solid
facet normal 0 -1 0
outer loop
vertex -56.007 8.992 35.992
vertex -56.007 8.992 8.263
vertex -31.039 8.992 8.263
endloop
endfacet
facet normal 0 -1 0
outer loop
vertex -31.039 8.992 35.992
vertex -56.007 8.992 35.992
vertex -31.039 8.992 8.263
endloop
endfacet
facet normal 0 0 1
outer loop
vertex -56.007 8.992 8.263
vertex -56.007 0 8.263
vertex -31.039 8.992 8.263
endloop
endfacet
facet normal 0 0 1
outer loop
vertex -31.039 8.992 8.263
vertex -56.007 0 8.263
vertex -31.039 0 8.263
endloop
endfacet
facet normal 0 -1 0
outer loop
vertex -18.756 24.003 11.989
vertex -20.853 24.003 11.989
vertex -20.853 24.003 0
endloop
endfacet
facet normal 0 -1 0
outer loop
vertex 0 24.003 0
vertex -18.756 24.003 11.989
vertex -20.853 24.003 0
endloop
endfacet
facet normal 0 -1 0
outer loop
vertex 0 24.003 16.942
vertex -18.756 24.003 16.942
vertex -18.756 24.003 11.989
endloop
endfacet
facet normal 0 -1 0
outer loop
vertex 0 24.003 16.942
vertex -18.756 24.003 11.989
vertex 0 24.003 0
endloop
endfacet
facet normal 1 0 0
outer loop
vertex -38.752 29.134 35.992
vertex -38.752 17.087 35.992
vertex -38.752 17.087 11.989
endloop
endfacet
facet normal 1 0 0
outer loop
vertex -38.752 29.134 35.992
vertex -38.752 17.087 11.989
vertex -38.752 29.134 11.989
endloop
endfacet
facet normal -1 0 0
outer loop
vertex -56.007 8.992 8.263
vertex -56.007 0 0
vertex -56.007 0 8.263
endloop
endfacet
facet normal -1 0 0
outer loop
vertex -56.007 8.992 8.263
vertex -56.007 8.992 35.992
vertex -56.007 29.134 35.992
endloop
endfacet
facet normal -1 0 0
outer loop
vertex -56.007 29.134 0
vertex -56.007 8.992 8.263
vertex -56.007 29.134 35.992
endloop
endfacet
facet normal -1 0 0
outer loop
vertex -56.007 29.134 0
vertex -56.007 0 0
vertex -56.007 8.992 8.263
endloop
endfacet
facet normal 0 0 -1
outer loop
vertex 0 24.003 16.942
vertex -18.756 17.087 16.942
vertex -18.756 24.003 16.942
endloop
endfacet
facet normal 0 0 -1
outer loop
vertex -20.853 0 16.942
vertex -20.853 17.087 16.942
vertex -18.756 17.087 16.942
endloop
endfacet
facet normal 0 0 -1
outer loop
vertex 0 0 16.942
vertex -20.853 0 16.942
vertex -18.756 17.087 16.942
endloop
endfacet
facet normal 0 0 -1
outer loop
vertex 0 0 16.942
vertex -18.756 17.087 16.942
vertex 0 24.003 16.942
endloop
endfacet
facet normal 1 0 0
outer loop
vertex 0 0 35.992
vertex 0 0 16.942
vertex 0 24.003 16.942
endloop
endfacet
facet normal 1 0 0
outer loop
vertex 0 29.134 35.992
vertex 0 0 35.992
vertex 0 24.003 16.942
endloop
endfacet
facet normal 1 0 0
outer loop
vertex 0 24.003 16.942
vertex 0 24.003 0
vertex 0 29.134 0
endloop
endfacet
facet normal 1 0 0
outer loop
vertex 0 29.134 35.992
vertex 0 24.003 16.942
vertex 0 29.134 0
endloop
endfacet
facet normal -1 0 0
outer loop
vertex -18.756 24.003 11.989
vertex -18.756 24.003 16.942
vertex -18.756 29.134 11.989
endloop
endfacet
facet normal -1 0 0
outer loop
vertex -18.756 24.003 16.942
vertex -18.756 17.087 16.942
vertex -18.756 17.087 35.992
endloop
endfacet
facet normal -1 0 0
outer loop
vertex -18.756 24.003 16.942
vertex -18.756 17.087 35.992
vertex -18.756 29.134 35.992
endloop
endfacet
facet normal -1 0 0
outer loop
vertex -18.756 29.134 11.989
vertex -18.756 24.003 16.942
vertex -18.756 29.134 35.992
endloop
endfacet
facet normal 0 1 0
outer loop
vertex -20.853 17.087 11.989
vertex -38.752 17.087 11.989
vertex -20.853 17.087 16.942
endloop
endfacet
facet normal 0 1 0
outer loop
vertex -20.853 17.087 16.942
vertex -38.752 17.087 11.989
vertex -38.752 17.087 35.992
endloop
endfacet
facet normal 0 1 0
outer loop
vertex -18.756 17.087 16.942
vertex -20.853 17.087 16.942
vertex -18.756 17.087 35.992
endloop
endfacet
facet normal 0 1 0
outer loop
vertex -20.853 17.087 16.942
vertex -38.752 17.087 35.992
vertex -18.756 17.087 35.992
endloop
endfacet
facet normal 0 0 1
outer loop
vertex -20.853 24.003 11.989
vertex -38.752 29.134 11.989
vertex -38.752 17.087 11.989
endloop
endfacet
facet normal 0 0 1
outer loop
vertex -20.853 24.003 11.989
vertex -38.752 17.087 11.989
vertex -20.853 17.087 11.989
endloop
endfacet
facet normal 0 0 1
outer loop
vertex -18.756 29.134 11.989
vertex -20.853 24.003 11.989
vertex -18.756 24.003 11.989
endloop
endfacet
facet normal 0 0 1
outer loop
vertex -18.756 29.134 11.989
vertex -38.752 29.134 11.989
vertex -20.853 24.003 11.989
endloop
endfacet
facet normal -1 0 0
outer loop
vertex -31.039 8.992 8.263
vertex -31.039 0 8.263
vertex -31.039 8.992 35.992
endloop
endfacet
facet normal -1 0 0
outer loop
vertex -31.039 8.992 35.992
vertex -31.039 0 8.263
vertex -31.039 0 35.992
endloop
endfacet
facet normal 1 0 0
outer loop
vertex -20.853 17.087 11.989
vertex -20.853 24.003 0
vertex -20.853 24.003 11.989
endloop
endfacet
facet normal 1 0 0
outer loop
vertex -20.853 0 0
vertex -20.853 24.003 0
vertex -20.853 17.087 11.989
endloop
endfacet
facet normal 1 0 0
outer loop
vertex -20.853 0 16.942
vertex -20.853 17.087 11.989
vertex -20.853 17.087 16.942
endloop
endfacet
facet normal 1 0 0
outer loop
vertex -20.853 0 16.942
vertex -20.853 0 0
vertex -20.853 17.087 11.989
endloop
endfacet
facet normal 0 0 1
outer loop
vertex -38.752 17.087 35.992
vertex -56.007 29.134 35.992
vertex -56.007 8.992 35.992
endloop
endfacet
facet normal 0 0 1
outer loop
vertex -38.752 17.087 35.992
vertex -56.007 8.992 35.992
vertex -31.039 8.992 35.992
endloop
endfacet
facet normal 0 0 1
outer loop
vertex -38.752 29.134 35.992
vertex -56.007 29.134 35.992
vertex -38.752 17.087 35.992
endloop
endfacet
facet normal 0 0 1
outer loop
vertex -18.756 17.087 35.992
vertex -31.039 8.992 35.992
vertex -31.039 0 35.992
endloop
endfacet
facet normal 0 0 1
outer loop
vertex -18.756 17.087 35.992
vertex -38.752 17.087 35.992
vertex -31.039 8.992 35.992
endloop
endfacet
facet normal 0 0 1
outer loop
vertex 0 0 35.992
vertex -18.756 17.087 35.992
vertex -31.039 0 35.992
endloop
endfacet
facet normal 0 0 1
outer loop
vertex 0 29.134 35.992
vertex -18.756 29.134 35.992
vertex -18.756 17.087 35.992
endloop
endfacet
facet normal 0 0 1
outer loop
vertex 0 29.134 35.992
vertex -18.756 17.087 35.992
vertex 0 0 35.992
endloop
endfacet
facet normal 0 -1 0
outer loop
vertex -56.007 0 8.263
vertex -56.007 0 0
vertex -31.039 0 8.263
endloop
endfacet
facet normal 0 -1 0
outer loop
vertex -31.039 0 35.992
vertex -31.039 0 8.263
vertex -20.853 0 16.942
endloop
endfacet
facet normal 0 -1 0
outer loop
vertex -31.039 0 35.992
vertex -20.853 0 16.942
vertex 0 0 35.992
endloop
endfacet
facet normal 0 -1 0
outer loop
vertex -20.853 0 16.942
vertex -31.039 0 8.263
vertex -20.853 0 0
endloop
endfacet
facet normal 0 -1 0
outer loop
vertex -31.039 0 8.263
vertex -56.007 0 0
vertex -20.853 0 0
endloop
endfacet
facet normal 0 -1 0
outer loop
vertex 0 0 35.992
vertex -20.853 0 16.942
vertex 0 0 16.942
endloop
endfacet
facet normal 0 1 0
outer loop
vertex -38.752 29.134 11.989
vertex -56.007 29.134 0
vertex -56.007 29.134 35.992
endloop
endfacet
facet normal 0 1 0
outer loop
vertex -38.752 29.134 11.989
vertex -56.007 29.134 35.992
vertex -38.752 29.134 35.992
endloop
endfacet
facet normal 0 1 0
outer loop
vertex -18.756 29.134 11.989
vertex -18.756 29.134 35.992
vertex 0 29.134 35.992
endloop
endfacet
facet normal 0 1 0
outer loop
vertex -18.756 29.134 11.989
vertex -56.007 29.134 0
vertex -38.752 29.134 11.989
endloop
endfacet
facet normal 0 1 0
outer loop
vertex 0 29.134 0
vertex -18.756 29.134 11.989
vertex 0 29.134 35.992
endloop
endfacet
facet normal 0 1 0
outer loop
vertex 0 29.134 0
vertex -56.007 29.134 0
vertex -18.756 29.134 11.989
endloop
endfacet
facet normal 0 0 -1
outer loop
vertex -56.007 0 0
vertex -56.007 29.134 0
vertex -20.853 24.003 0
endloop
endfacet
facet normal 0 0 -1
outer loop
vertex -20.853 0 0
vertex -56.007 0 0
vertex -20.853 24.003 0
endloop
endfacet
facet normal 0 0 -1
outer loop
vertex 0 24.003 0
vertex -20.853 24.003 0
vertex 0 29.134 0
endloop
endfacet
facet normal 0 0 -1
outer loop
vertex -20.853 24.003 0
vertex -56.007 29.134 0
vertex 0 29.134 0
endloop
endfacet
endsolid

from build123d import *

# Parameters (mm, degrees)
F0_W     = 56.007
F0_H     = 29.1338
F2_DEPTH = 35.9918
F3_W     = 19.9962444603
F3_H     = 12.0468917788
F4_DEPTH = 24.003
F5_W     = 20.8534
F5_H     = 16.9418
F7_DEPTH = 24.003
F8_DEPTH = 8.9916


with BuildPart() as f2:
    # F0 (on Top) → F2 (new body)
    with BuildSketch(Plane.XY):
        with Locations((-28.0035, 14.5669)):
            Rectangle(F0_W, F0_H)
    extrude(amount=F2_DEPTH)

    # F3 (on face) → F4 (cut)
    with BuildSketch(Plane.XY.offset(35.9918)):
        with Locations((-28.7540312856, 23.1103541106)):
            Rectangle(F3_W, F3_H)
    extrude(amount=-F4_DEPTH, mode=Mode.SUBTRACT)

    # F5 (on face) → F7 (cut)
    with BuildSketch(Plane.XZ):
        with Locations((-10.4267, 8.4709)):
            Rectangle(F5_W, F5_H)
    extrude(amount=-F7_DEPTH, mode=Mode.SUBTRACT)

    # F5 (on face) → F8 (cut)
    with BuildSketch(Plane.XZ):
        Polygon((-56.007, 35.9918), (-56.007, 8.2625951707), (-31.0388, 8.2625951707), (-31.0388, 24.003), (-31.0388, 35.9918), align=None)
    extrude(amount=-F8_DEPTH, mode=Mode.SUBTRACT)


solid = f2.part
